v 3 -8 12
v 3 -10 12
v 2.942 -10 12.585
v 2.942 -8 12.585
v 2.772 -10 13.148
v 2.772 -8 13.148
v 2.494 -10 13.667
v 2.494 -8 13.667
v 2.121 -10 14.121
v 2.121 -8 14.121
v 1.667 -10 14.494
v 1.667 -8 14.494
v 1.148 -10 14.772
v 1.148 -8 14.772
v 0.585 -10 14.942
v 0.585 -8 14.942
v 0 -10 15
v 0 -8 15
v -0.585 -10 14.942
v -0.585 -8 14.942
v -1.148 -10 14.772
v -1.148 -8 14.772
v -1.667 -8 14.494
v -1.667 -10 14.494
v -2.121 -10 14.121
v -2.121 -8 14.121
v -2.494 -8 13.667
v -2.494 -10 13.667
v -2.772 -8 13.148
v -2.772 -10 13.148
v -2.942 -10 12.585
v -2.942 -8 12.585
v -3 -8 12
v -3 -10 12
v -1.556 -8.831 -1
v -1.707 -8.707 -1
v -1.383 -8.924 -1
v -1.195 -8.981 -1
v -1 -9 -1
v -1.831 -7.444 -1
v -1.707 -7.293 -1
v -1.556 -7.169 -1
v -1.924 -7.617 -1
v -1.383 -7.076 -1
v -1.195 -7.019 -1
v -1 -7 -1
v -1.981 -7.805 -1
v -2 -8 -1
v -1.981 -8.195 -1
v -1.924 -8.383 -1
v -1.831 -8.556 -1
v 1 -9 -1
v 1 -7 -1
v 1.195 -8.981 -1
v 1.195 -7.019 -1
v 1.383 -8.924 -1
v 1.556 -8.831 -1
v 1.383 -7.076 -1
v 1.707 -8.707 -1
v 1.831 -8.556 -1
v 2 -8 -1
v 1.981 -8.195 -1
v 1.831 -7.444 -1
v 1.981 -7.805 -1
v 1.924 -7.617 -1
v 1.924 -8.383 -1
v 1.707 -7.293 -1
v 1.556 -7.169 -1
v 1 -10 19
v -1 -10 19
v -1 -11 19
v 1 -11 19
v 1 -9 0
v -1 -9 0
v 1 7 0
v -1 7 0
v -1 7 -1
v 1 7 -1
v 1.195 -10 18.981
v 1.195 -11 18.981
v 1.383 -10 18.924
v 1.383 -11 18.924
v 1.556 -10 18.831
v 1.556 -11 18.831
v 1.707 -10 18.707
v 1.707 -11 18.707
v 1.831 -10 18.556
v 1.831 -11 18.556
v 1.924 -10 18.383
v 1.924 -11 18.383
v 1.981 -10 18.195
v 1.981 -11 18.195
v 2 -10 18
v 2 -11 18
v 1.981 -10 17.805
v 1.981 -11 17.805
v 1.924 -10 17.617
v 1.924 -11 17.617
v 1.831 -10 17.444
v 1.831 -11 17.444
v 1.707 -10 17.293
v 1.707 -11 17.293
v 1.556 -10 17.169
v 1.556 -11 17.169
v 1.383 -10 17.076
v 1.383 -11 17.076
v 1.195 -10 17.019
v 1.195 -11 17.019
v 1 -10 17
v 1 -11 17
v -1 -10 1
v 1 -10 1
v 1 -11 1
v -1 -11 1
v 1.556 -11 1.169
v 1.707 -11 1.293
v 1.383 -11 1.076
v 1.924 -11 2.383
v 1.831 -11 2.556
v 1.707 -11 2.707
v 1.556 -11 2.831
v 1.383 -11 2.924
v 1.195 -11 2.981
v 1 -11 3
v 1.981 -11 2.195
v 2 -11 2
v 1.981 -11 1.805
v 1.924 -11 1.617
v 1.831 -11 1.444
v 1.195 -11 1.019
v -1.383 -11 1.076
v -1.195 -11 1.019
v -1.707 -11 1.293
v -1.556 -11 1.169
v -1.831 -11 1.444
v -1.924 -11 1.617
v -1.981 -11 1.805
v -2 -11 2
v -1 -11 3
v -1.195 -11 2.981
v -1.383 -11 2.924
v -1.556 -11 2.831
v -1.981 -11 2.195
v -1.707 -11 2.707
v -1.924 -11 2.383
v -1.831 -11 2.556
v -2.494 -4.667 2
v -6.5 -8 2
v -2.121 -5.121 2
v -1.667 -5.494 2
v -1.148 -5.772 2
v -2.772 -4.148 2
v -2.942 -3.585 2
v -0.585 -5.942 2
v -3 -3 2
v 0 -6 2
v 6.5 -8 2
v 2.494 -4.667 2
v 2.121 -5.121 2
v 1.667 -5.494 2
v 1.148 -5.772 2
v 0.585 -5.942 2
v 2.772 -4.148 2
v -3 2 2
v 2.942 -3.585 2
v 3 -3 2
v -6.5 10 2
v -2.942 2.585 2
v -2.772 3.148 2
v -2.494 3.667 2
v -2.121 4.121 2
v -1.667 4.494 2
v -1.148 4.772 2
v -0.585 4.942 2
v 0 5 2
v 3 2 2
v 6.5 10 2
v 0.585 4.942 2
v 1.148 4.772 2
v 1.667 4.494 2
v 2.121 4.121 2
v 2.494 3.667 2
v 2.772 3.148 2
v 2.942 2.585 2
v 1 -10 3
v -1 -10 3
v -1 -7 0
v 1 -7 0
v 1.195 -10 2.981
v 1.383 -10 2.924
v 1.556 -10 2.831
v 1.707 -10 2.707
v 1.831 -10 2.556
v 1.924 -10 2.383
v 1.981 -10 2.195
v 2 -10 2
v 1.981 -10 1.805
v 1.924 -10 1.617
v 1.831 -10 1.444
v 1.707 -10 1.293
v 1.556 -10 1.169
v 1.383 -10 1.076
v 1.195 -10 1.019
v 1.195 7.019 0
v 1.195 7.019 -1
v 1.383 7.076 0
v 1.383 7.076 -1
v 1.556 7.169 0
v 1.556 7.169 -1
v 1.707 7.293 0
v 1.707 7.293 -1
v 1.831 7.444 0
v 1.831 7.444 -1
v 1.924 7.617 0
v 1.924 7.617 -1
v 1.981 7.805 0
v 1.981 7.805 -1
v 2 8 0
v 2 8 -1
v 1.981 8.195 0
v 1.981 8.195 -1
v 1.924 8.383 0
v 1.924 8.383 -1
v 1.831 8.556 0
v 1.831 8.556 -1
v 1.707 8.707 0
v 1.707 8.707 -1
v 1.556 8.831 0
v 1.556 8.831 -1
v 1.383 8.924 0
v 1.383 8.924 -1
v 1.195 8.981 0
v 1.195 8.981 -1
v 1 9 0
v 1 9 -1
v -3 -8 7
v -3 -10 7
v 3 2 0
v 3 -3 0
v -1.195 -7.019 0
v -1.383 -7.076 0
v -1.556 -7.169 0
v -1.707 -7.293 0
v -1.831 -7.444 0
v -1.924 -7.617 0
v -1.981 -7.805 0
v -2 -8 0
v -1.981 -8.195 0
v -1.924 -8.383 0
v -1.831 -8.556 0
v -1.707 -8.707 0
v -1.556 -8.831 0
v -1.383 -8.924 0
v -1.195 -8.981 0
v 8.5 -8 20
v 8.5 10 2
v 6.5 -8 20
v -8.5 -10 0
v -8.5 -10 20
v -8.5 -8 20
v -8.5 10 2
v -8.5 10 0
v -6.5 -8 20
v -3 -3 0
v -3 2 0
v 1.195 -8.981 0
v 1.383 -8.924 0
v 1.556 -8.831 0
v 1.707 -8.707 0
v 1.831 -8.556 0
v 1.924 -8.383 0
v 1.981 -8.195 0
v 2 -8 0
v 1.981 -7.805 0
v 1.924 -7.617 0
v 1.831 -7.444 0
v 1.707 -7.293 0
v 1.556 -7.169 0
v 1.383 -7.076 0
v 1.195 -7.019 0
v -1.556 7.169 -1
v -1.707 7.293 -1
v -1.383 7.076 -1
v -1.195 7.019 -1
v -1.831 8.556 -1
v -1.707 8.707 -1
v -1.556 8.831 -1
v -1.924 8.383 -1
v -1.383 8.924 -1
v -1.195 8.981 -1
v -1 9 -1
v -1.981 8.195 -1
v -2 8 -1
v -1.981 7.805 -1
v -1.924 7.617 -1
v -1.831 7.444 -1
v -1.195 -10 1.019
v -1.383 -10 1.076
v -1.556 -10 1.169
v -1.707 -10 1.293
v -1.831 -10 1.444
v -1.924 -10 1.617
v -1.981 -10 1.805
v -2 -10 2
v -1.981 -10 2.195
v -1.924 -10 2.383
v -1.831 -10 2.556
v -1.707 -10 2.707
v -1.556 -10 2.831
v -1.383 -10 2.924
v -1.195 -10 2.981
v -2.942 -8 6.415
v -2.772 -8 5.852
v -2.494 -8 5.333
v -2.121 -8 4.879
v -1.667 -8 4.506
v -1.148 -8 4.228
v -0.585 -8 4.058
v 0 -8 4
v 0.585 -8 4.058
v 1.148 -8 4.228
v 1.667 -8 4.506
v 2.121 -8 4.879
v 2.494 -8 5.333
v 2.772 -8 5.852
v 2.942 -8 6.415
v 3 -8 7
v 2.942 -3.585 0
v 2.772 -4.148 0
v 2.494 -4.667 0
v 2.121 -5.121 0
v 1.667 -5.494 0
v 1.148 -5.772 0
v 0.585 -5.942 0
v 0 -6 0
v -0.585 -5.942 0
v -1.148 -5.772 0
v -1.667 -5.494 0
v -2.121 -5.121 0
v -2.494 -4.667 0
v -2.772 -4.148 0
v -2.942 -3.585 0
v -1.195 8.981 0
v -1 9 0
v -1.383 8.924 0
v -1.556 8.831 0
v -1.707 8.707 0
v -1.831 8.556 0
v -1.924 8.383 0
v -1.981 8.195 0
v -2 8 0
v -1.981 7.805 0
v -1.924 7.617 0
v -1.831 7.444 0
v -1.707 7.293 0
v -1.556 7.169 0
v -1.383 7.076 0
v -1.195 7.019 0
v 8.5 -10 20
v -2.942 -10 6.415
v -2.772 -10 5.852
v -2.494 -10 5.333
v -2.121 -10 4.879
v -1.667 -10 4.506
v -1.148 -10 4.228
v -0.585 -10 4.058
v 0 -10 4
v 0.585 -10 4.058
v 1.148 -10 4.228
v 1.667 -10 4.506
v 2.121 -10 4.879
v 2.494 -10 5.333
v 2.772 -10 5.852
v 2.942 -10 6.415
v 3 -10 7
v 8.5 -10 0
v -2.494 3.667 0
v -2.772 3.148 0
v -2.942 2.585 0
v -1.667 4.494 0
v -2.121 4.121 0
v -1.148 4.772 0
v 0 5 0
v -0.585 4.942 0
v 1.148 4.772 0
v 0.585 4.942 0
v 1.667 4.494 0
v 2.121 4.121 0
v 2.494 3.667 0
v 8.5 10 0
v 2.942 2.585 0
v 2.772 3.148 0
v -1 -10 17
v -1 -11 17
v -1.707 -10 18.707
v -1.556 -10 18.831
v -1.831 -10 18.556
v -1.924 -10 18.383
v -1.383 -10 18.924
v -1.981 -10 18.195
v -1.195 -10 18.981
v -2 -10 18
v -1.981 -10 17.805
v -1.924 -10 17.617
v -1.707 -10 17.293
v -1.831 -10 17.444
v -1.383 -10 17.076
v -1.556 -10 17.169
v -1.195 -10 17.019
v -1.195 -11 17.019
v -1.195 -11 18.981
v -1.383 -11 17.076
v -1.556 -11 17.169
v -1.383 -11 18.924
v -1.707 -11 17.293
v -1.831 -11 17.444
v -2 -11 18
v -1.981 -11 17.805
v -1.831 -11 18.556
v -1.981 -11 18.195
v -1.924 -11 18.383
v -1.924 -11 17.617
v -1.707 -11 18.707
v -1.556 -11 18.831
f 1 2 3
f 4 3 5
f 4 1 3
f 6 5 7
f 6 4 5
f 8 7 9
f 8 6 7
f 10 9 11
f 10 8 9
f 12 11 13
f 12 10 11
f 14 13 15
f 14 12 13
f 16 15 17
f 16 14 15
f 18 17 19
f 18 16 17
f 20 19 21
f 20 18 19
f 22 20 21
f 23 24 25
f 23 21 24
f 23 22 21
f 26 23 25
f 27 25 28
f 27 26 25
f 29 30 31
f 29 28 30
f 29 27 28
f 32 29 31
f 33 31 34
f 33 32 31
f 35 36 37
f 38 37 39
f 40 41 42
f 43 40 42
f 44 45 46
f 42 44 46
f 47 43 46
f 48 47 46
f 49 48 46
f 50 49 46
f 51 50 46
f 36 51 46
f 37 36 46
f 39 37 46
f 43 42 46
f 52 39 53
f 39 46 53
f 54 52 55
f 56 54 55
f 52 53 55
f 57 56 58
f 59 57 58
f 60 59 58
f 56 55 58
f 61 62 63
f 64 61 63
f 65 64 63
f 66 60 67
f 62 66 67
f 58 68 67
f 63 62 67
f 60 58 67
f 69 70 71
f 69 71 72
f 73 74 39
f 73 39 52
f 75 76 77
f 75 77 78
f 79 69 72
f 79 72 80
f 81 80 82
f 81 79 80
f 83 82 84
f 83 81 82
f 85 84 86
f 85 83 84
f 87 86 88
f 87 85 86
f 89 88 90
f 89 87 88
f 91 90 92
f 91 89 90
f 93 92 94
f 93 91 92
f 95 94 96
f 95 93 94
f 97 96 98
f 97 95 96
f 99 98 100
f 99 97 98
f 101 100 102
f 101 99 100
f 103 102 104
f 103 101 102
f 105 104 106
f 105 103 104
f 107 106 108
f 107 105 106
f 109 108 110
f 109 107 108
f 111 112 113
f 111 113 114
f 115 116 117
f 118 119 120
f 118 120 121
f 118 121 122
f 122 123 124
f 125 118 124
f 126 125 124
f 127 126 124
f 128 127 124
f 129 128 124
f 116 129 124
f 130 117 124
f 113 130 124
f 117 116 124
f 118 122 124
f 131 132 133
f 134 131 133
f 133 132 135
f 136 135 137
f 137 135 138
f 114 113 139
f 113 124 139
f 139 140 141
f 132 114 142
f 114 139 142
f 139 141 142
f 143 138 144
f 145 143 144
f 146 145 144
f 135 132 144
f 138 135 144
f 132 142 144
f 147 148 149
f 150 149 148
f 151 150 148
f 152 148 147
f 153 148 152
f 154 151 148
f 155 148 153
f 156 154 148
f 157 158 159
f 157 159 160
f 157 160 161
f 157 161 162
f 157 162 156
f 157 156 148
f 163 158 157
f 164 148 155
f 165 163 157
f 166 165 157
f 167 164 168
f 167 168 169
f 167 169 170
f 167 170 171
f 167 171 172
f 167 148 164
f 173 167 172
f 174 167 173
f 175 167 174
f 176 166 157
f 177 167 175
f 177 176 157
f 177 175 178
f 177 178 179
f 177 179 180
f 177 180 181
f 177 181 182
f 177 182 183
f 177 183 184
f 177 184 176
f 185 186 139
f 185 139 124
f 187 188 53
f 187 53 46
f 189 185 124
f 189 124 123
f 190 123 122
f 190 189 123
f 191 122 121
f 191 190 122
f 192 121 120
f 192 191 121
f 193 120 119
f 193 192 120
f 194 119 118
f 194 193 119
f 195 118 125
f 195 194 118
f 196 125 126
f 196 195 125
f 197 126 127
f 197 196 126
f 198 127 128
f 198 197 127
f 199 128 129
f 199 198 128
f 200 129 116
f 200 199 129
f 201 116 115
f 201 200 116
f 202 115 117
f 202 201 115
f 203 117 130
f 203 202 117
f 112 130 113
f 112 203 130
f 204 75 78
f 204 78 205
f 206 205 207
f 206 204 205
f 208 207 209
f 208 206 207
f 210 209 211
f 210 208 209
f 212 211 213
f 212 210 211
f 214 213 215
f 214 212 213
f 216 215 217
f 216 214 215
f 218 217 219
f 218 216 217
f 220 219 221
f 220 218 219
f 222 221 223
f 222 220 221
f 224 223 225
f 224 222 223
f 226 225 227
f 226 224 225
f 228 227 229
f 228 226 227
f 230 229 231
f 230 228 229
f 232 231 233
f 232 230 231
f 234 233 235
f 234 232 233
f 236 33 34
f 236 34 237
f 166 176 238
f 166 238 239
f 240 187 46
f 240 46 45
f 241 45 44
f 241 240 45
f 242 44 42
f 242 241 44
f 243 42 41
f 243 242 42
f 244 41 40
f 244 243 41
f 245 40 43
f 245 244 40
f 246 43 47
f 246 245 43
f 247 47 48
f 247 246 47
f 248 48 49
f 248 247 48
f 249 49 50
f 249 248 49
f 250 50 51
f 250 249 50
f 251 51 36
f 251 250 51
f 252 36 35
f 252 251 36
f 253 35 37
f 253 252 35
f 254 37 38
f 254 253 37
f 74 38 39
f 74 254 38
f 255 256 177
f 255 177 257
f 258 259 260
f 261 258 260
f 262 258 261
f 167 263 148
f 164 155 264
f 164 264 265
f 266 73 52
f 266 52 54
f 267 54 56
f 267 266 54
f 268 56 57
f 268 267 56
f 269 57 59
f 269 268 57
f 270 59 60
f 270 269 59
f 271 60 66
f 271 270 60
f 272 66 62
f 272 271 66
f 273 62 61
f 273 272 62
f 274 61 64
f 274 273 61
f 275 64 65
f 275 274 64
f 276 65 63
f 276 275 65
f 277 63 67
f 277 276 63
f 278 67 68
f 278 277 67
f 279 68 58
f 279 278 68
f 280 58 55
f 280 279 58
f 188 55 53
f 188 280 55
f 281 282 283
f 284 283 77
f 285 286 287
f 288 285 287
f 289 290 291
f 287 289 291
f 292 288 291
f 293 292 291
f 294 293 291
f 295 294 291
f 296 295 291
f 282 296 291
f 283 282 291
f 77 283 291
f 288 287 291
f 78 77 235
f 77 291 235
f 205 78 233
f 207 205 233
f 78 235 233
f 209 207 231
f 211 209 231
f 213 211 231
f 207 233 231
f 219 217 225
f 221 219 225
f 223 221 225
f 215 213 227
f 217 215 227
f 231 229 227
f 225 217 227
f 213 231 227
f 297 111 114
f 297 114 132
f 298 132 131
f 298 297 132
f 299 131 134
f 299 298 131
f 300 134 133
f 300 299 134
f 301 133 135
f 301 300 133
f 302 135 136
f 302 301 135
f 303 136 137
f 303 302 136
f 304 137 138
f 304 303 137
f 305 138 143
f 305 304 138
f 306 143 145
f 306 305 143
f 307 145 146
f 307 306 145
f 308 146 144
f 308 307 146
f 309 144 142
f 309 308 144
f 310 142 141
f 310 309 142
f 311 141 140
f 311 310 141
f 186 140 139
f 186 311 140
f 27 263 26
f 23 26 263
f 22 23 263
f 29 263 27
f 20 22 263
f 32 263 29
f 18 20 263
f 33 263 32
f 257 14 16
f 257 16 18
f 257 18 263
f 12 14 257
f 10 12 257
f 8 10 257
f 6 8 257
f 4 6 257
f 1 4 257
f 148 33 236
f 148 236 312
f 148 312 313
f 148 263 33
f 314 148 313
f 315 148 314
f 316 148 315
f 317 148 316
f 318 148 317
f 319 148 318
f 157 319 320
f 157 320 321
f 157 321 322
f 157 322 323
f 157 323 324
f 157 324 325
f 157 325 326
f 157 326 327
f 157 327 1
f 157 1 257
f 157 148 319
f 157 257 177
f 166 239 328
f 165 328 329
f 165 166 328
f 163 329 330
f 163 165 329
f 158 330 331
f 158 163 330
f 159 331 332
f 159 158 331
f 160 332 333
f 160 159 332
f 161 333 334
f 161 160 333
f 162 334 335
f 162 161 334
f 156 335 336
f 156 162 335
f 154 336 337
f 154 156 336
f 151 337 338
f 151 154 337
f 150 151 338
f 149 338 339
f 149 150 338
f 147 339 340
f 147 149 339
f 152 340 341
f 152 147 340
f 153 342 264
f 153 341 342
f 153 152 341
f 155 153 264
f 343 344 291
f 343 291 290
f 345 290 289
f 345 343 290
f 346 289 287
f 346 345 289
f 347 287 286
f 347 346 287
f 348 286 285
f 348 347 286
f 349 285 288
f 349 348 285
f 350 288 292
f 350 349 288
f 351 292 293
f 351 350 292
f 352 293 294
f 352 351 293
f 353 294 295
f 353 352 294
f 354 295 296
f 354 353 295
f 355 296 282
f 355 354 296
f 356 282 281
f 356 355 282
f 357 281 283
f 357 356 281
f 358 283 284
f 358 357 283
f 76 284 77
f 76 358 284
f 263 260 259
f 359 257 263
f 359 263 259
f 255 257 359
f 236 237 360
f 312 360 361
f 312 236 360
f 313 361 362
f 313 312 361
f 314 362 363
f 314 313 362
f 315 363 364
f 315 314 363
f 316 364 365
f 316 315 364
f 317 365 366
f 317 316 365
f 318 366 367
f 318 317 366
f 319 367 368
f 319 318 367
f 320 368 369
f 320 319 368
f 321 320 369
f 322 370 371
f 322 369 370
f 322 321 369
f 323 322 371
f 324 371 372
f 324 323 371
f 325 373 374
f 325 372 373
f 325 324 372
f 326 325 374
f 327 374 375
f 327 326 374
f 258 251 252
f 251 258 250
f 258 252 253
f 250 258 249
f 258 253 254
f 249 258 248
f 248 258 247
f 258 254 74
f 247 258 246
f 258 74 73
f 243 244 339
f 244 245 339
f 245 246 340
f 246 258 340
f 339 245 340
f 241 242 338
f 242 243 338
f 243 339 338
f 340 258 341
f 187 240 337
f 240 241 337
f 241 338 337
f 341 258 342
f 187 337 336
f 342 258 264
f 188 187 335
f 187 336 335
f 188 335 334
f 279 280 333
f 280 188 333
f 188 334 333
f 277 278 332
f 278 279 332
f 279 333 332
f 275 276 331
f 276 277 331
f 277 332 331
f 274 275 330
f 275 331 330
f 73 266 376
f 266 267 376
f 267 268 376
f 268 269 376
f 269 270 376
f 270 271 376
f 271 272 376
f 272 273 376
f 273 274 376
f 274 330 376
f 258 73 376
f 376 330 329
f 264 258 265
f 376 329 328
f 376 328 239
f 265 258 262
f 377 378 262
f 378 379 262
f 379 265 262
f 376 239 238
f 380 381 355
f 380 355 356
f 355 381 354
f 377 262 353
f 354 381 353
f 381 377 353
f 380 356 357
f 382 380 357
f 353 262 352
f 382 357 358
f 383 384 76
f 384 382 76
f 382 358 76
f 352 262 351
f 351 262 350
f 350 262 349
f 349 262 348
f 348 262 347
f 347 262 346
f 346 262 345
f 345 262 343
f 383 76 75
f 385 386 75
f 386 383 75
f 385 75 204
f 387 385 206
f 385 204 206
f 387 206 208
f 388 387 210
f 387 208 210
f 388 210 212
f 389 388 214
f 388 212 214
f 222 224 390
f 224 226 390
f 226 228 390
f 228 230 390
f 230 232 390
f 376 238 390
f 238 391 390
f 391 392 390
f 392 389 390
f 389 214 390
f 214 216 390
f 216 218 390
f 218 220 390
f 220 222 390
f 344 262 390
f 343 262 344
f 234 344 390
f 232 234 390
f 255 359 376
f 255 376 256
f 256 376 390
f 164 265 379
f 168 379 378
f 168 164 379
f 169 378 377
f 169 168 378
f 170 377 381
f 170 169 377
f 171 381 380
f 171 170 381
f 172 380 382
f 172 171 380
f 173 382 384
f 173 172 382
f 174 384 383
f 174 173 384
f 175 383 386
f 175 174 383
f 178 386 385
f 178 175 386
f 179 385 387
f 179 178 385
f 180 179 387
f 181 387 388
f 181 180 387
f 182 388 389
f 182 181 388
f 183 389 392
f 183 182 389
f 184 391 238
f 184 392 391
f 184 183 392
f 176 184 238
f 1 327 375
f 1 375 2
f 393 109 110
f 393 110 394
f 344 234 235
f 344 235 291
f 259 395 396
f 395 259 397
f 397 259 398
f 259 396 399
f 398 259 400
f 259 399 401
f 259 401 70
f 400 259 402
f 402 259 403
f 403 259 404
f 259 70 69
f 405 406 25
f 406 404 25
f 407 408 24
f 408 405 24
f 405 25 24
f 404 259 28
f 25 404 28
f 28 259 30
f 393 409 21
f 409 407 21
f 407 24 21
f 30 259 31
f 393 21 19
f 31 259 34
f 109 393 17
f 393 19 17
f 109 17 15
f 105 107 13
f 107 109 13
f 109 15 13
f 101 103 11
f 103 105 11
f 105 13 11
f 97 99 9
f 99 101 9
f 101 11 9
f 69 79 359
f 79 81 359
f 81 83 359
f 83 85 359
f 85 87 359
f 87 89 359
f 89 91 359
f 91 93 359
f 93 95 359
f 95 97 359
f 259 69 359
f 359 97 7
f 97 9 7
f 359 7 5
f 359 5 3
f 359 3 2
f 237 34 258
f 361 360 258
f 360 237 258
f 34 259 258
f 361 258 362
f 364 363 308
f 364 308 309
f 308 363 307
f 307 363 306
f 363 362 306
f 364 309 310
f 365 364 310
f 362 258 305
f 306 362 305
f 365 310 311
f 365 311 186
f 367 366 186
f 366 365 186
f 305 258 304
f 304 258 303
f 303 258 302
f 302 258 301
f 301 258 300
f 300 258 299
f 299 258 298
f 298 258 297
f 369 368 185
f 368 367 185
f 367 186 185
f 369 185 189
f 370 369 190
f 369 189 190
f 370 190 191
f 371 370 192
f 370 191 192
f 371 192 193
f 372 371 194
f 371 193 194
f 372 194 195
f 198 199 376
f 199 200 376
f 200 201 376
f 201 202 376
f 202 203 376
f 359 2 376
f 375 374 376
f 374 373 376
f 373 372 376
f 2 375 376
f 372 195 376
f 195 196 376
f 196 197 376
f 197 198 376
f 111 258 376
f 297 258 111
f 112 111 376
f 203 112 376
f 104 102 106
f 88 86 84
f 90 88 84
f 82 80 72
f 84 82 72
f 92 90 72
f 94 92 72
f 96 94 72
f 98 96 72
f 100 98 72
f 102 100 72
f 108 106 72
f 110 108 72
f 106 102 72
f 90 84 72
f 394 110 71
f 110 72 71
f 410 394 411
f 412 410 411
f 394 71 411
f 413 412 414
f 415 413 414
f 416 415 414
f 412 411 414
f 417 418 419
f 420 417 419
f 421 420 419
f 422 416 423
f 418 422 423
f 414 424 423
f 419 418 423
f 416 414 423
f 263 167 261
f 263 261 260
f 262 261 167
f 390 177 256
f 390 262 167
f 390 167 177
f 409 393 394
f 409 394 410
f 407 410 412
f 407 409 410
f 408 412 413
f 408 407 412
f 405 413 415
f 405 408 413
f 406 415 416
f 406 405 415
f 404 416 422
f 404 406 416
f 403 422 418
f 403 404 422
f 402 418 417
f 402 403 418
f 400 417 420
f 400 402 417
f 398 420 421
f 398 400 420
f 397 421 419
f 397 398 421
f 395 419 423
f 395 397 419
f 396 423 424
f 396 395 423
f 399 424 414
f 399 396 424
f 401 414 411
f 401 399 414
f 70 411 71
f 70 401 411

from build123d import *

# Parameters (mm, degrees)
SKETCH1_W               = 17
SKETCH1_H               = 20
BOSS_EXTRUDE1_DEPTH     = 20
SKETCH2_W               = 13
SKETCH2_H               = 18
CUT_EXTRUDE1_DEPTH      = 18
CUT_EXTRUDE2_DEPTH      = 1
CUT_EXTRUDE2_DEPTH_BACK = 18
CUT_EXTRUDE3_REACH      = 4
CUT_EXTRUDE4_REACH      = 4
BOSS_EXTRUDE2_DEPTH     = 1
BOSS_EXTRUDE3_DEPTH     = 1


with BuildPart() as part:
    # Sketch1 → Boss-Extrude1 (new body)
    with BuildSketch(Plane.XY):
        Rectangle(SKETCH1_W, SKETCH1_H)
    extrude(amount=BOSS_EXTRUDE1_DEPTH)

    # Sketch2 → Cut-Extrude1 (cut)
    with BuildSketch(Plane(origin=(0, 10, 0), x_dir=(1, 0, 0), z_dir=(0, 1, 0))):
        with Locations((0, -11)):
            Rectangle(SKETCH2_W, SKETCH2_H)
    extrude(amount=-CUT_EXTRUDE1_DEPTH, mode=Mode.SUBTRACT)

    # Sketch3 → Cut-Extrude2 (cut, two sides)
    with BuildSketch(Plane(origin=(8.5, 0, 0), x_dir=(0, 0, -1), z_dir=(1, 0, 0))) as cut_extrude2_sk:
        Polygon((-2, 10), (-20, -8), (-20, 10), align=None)
    extrude(amount=CUT_EXTRUDE2_DEPTH, mode=Mode.SUBTRACT)
    extrude(cut_extrude2_sk.sketch, amount=-CUT_EXTRUDE2_DEPTH_BACK, mode=Mode.SUBTRACT)

    # Sketch4 → Cut-Extrude3 (cut, up to next)
    with BuildSketch(Plane(origin=(0, -8, 0), x_dir=(1, 0, 0), z_dir=(0, 1, 0)), mode=Mode.PRIVATE) as cut_extrude3_sk1:
        with BuildLine():
            Line((-3, -12), (-3, -7))
            ThreePointArc((-3, -7), (0, -4), (3, -7))
            Line((3, -7), (3, -12))
            ThreePointArc((3, -12), (0, -15), (-3, -12))
        make_face()
    cut_extrude3_tool1 = extrude(cut_extrude3_sk1.sketch, amount=-CUT_EXTRUDE3_REACH, mode=Mode.PRIVATE) & part.part
    add(cut_extrude3_tool1.solids().sort_by_distance((0, -8, 9.5))[0], mode=Mode.SUBTRACT)

    # Sketch5 → Cut-Extrude4 (cut, up to next)
    with BuildSketch(Plane.XY.offset(2), mode=Mode.PRIVATE) as cut_extrude4_sk1:
        with BuildLine():
            Line((-3, -3), (-3, 2))
            ThreePointArc((-3, 2), (0, 5), (3, 2))
            Line((3, 2), (3, -3))
            ThreePointArc((3, -3), (0, -6), (-3, -3))
        make_face()
    cut_extrude4_tool1 = extrude(cut_extrude4_sk1.sketch, amount=-CUT_EXTRUDE4_REACH, mode=Mode.PRIVATE) & part.part
    add(cut_extrude4_tool1.solids().sort_by_distance((0, -0.5, 2))[0], mode=Mode.SUBTRACT)

    # Sketch6 → Boss-Extrude2 (add)
    with BuildSketch(Plane.XZ.offset(10)):
        with BuildLine():
            Line((-1, 19), (1, 19))
            ThreePointArc((1, 19), (2, 18), (1, 17))
            Line((1, 17), (-1, 17))
            ThreePointArc((-1, 17), (-2, 18), (-1, 19))
        make_face()
        with BuildLine():
            Line((-1, 3), (1, 3))
            ThreePointArc((1, 3), (2, 2), (1, 1))
            Line((1, 1), (-1, 1))
            ThreePointArc((-1, 1), (-2, 2), (-1, 3))
        make_face()
    extrude(amount=BOSS_EXTRUDE2_DEPTH)

    # Sketch7 → Boss-Extrude3 (add)
    with BuildSketch(Plane(origin=(0, 0, 0), x_dir=(-1, 0, 0), z_dir=(0, 0, -1))):
        with BuildLine():
            Line((1, -9), (-1, -9))
            ThreePointArc((-1, -9), (-2, -8), (-1, -7))
            Line((-1, -7), (1, -7))
            ThreePointArc((1, -7), (2, -8), (1, -9))
        make_face()
        with BuildLine():
            Line((1, 7), (-1, 7))
            ThreePointArc((-1, 7), (-2, 8), (-1, 9))
            Line((-1, 9), (1, 9))
            ThreePointArc((1, 9), (2, 8), (1, 7))
        make_face()
    extrude(amount=BOSS_EXTRUDE3_DEPTH)


solid = part.part
